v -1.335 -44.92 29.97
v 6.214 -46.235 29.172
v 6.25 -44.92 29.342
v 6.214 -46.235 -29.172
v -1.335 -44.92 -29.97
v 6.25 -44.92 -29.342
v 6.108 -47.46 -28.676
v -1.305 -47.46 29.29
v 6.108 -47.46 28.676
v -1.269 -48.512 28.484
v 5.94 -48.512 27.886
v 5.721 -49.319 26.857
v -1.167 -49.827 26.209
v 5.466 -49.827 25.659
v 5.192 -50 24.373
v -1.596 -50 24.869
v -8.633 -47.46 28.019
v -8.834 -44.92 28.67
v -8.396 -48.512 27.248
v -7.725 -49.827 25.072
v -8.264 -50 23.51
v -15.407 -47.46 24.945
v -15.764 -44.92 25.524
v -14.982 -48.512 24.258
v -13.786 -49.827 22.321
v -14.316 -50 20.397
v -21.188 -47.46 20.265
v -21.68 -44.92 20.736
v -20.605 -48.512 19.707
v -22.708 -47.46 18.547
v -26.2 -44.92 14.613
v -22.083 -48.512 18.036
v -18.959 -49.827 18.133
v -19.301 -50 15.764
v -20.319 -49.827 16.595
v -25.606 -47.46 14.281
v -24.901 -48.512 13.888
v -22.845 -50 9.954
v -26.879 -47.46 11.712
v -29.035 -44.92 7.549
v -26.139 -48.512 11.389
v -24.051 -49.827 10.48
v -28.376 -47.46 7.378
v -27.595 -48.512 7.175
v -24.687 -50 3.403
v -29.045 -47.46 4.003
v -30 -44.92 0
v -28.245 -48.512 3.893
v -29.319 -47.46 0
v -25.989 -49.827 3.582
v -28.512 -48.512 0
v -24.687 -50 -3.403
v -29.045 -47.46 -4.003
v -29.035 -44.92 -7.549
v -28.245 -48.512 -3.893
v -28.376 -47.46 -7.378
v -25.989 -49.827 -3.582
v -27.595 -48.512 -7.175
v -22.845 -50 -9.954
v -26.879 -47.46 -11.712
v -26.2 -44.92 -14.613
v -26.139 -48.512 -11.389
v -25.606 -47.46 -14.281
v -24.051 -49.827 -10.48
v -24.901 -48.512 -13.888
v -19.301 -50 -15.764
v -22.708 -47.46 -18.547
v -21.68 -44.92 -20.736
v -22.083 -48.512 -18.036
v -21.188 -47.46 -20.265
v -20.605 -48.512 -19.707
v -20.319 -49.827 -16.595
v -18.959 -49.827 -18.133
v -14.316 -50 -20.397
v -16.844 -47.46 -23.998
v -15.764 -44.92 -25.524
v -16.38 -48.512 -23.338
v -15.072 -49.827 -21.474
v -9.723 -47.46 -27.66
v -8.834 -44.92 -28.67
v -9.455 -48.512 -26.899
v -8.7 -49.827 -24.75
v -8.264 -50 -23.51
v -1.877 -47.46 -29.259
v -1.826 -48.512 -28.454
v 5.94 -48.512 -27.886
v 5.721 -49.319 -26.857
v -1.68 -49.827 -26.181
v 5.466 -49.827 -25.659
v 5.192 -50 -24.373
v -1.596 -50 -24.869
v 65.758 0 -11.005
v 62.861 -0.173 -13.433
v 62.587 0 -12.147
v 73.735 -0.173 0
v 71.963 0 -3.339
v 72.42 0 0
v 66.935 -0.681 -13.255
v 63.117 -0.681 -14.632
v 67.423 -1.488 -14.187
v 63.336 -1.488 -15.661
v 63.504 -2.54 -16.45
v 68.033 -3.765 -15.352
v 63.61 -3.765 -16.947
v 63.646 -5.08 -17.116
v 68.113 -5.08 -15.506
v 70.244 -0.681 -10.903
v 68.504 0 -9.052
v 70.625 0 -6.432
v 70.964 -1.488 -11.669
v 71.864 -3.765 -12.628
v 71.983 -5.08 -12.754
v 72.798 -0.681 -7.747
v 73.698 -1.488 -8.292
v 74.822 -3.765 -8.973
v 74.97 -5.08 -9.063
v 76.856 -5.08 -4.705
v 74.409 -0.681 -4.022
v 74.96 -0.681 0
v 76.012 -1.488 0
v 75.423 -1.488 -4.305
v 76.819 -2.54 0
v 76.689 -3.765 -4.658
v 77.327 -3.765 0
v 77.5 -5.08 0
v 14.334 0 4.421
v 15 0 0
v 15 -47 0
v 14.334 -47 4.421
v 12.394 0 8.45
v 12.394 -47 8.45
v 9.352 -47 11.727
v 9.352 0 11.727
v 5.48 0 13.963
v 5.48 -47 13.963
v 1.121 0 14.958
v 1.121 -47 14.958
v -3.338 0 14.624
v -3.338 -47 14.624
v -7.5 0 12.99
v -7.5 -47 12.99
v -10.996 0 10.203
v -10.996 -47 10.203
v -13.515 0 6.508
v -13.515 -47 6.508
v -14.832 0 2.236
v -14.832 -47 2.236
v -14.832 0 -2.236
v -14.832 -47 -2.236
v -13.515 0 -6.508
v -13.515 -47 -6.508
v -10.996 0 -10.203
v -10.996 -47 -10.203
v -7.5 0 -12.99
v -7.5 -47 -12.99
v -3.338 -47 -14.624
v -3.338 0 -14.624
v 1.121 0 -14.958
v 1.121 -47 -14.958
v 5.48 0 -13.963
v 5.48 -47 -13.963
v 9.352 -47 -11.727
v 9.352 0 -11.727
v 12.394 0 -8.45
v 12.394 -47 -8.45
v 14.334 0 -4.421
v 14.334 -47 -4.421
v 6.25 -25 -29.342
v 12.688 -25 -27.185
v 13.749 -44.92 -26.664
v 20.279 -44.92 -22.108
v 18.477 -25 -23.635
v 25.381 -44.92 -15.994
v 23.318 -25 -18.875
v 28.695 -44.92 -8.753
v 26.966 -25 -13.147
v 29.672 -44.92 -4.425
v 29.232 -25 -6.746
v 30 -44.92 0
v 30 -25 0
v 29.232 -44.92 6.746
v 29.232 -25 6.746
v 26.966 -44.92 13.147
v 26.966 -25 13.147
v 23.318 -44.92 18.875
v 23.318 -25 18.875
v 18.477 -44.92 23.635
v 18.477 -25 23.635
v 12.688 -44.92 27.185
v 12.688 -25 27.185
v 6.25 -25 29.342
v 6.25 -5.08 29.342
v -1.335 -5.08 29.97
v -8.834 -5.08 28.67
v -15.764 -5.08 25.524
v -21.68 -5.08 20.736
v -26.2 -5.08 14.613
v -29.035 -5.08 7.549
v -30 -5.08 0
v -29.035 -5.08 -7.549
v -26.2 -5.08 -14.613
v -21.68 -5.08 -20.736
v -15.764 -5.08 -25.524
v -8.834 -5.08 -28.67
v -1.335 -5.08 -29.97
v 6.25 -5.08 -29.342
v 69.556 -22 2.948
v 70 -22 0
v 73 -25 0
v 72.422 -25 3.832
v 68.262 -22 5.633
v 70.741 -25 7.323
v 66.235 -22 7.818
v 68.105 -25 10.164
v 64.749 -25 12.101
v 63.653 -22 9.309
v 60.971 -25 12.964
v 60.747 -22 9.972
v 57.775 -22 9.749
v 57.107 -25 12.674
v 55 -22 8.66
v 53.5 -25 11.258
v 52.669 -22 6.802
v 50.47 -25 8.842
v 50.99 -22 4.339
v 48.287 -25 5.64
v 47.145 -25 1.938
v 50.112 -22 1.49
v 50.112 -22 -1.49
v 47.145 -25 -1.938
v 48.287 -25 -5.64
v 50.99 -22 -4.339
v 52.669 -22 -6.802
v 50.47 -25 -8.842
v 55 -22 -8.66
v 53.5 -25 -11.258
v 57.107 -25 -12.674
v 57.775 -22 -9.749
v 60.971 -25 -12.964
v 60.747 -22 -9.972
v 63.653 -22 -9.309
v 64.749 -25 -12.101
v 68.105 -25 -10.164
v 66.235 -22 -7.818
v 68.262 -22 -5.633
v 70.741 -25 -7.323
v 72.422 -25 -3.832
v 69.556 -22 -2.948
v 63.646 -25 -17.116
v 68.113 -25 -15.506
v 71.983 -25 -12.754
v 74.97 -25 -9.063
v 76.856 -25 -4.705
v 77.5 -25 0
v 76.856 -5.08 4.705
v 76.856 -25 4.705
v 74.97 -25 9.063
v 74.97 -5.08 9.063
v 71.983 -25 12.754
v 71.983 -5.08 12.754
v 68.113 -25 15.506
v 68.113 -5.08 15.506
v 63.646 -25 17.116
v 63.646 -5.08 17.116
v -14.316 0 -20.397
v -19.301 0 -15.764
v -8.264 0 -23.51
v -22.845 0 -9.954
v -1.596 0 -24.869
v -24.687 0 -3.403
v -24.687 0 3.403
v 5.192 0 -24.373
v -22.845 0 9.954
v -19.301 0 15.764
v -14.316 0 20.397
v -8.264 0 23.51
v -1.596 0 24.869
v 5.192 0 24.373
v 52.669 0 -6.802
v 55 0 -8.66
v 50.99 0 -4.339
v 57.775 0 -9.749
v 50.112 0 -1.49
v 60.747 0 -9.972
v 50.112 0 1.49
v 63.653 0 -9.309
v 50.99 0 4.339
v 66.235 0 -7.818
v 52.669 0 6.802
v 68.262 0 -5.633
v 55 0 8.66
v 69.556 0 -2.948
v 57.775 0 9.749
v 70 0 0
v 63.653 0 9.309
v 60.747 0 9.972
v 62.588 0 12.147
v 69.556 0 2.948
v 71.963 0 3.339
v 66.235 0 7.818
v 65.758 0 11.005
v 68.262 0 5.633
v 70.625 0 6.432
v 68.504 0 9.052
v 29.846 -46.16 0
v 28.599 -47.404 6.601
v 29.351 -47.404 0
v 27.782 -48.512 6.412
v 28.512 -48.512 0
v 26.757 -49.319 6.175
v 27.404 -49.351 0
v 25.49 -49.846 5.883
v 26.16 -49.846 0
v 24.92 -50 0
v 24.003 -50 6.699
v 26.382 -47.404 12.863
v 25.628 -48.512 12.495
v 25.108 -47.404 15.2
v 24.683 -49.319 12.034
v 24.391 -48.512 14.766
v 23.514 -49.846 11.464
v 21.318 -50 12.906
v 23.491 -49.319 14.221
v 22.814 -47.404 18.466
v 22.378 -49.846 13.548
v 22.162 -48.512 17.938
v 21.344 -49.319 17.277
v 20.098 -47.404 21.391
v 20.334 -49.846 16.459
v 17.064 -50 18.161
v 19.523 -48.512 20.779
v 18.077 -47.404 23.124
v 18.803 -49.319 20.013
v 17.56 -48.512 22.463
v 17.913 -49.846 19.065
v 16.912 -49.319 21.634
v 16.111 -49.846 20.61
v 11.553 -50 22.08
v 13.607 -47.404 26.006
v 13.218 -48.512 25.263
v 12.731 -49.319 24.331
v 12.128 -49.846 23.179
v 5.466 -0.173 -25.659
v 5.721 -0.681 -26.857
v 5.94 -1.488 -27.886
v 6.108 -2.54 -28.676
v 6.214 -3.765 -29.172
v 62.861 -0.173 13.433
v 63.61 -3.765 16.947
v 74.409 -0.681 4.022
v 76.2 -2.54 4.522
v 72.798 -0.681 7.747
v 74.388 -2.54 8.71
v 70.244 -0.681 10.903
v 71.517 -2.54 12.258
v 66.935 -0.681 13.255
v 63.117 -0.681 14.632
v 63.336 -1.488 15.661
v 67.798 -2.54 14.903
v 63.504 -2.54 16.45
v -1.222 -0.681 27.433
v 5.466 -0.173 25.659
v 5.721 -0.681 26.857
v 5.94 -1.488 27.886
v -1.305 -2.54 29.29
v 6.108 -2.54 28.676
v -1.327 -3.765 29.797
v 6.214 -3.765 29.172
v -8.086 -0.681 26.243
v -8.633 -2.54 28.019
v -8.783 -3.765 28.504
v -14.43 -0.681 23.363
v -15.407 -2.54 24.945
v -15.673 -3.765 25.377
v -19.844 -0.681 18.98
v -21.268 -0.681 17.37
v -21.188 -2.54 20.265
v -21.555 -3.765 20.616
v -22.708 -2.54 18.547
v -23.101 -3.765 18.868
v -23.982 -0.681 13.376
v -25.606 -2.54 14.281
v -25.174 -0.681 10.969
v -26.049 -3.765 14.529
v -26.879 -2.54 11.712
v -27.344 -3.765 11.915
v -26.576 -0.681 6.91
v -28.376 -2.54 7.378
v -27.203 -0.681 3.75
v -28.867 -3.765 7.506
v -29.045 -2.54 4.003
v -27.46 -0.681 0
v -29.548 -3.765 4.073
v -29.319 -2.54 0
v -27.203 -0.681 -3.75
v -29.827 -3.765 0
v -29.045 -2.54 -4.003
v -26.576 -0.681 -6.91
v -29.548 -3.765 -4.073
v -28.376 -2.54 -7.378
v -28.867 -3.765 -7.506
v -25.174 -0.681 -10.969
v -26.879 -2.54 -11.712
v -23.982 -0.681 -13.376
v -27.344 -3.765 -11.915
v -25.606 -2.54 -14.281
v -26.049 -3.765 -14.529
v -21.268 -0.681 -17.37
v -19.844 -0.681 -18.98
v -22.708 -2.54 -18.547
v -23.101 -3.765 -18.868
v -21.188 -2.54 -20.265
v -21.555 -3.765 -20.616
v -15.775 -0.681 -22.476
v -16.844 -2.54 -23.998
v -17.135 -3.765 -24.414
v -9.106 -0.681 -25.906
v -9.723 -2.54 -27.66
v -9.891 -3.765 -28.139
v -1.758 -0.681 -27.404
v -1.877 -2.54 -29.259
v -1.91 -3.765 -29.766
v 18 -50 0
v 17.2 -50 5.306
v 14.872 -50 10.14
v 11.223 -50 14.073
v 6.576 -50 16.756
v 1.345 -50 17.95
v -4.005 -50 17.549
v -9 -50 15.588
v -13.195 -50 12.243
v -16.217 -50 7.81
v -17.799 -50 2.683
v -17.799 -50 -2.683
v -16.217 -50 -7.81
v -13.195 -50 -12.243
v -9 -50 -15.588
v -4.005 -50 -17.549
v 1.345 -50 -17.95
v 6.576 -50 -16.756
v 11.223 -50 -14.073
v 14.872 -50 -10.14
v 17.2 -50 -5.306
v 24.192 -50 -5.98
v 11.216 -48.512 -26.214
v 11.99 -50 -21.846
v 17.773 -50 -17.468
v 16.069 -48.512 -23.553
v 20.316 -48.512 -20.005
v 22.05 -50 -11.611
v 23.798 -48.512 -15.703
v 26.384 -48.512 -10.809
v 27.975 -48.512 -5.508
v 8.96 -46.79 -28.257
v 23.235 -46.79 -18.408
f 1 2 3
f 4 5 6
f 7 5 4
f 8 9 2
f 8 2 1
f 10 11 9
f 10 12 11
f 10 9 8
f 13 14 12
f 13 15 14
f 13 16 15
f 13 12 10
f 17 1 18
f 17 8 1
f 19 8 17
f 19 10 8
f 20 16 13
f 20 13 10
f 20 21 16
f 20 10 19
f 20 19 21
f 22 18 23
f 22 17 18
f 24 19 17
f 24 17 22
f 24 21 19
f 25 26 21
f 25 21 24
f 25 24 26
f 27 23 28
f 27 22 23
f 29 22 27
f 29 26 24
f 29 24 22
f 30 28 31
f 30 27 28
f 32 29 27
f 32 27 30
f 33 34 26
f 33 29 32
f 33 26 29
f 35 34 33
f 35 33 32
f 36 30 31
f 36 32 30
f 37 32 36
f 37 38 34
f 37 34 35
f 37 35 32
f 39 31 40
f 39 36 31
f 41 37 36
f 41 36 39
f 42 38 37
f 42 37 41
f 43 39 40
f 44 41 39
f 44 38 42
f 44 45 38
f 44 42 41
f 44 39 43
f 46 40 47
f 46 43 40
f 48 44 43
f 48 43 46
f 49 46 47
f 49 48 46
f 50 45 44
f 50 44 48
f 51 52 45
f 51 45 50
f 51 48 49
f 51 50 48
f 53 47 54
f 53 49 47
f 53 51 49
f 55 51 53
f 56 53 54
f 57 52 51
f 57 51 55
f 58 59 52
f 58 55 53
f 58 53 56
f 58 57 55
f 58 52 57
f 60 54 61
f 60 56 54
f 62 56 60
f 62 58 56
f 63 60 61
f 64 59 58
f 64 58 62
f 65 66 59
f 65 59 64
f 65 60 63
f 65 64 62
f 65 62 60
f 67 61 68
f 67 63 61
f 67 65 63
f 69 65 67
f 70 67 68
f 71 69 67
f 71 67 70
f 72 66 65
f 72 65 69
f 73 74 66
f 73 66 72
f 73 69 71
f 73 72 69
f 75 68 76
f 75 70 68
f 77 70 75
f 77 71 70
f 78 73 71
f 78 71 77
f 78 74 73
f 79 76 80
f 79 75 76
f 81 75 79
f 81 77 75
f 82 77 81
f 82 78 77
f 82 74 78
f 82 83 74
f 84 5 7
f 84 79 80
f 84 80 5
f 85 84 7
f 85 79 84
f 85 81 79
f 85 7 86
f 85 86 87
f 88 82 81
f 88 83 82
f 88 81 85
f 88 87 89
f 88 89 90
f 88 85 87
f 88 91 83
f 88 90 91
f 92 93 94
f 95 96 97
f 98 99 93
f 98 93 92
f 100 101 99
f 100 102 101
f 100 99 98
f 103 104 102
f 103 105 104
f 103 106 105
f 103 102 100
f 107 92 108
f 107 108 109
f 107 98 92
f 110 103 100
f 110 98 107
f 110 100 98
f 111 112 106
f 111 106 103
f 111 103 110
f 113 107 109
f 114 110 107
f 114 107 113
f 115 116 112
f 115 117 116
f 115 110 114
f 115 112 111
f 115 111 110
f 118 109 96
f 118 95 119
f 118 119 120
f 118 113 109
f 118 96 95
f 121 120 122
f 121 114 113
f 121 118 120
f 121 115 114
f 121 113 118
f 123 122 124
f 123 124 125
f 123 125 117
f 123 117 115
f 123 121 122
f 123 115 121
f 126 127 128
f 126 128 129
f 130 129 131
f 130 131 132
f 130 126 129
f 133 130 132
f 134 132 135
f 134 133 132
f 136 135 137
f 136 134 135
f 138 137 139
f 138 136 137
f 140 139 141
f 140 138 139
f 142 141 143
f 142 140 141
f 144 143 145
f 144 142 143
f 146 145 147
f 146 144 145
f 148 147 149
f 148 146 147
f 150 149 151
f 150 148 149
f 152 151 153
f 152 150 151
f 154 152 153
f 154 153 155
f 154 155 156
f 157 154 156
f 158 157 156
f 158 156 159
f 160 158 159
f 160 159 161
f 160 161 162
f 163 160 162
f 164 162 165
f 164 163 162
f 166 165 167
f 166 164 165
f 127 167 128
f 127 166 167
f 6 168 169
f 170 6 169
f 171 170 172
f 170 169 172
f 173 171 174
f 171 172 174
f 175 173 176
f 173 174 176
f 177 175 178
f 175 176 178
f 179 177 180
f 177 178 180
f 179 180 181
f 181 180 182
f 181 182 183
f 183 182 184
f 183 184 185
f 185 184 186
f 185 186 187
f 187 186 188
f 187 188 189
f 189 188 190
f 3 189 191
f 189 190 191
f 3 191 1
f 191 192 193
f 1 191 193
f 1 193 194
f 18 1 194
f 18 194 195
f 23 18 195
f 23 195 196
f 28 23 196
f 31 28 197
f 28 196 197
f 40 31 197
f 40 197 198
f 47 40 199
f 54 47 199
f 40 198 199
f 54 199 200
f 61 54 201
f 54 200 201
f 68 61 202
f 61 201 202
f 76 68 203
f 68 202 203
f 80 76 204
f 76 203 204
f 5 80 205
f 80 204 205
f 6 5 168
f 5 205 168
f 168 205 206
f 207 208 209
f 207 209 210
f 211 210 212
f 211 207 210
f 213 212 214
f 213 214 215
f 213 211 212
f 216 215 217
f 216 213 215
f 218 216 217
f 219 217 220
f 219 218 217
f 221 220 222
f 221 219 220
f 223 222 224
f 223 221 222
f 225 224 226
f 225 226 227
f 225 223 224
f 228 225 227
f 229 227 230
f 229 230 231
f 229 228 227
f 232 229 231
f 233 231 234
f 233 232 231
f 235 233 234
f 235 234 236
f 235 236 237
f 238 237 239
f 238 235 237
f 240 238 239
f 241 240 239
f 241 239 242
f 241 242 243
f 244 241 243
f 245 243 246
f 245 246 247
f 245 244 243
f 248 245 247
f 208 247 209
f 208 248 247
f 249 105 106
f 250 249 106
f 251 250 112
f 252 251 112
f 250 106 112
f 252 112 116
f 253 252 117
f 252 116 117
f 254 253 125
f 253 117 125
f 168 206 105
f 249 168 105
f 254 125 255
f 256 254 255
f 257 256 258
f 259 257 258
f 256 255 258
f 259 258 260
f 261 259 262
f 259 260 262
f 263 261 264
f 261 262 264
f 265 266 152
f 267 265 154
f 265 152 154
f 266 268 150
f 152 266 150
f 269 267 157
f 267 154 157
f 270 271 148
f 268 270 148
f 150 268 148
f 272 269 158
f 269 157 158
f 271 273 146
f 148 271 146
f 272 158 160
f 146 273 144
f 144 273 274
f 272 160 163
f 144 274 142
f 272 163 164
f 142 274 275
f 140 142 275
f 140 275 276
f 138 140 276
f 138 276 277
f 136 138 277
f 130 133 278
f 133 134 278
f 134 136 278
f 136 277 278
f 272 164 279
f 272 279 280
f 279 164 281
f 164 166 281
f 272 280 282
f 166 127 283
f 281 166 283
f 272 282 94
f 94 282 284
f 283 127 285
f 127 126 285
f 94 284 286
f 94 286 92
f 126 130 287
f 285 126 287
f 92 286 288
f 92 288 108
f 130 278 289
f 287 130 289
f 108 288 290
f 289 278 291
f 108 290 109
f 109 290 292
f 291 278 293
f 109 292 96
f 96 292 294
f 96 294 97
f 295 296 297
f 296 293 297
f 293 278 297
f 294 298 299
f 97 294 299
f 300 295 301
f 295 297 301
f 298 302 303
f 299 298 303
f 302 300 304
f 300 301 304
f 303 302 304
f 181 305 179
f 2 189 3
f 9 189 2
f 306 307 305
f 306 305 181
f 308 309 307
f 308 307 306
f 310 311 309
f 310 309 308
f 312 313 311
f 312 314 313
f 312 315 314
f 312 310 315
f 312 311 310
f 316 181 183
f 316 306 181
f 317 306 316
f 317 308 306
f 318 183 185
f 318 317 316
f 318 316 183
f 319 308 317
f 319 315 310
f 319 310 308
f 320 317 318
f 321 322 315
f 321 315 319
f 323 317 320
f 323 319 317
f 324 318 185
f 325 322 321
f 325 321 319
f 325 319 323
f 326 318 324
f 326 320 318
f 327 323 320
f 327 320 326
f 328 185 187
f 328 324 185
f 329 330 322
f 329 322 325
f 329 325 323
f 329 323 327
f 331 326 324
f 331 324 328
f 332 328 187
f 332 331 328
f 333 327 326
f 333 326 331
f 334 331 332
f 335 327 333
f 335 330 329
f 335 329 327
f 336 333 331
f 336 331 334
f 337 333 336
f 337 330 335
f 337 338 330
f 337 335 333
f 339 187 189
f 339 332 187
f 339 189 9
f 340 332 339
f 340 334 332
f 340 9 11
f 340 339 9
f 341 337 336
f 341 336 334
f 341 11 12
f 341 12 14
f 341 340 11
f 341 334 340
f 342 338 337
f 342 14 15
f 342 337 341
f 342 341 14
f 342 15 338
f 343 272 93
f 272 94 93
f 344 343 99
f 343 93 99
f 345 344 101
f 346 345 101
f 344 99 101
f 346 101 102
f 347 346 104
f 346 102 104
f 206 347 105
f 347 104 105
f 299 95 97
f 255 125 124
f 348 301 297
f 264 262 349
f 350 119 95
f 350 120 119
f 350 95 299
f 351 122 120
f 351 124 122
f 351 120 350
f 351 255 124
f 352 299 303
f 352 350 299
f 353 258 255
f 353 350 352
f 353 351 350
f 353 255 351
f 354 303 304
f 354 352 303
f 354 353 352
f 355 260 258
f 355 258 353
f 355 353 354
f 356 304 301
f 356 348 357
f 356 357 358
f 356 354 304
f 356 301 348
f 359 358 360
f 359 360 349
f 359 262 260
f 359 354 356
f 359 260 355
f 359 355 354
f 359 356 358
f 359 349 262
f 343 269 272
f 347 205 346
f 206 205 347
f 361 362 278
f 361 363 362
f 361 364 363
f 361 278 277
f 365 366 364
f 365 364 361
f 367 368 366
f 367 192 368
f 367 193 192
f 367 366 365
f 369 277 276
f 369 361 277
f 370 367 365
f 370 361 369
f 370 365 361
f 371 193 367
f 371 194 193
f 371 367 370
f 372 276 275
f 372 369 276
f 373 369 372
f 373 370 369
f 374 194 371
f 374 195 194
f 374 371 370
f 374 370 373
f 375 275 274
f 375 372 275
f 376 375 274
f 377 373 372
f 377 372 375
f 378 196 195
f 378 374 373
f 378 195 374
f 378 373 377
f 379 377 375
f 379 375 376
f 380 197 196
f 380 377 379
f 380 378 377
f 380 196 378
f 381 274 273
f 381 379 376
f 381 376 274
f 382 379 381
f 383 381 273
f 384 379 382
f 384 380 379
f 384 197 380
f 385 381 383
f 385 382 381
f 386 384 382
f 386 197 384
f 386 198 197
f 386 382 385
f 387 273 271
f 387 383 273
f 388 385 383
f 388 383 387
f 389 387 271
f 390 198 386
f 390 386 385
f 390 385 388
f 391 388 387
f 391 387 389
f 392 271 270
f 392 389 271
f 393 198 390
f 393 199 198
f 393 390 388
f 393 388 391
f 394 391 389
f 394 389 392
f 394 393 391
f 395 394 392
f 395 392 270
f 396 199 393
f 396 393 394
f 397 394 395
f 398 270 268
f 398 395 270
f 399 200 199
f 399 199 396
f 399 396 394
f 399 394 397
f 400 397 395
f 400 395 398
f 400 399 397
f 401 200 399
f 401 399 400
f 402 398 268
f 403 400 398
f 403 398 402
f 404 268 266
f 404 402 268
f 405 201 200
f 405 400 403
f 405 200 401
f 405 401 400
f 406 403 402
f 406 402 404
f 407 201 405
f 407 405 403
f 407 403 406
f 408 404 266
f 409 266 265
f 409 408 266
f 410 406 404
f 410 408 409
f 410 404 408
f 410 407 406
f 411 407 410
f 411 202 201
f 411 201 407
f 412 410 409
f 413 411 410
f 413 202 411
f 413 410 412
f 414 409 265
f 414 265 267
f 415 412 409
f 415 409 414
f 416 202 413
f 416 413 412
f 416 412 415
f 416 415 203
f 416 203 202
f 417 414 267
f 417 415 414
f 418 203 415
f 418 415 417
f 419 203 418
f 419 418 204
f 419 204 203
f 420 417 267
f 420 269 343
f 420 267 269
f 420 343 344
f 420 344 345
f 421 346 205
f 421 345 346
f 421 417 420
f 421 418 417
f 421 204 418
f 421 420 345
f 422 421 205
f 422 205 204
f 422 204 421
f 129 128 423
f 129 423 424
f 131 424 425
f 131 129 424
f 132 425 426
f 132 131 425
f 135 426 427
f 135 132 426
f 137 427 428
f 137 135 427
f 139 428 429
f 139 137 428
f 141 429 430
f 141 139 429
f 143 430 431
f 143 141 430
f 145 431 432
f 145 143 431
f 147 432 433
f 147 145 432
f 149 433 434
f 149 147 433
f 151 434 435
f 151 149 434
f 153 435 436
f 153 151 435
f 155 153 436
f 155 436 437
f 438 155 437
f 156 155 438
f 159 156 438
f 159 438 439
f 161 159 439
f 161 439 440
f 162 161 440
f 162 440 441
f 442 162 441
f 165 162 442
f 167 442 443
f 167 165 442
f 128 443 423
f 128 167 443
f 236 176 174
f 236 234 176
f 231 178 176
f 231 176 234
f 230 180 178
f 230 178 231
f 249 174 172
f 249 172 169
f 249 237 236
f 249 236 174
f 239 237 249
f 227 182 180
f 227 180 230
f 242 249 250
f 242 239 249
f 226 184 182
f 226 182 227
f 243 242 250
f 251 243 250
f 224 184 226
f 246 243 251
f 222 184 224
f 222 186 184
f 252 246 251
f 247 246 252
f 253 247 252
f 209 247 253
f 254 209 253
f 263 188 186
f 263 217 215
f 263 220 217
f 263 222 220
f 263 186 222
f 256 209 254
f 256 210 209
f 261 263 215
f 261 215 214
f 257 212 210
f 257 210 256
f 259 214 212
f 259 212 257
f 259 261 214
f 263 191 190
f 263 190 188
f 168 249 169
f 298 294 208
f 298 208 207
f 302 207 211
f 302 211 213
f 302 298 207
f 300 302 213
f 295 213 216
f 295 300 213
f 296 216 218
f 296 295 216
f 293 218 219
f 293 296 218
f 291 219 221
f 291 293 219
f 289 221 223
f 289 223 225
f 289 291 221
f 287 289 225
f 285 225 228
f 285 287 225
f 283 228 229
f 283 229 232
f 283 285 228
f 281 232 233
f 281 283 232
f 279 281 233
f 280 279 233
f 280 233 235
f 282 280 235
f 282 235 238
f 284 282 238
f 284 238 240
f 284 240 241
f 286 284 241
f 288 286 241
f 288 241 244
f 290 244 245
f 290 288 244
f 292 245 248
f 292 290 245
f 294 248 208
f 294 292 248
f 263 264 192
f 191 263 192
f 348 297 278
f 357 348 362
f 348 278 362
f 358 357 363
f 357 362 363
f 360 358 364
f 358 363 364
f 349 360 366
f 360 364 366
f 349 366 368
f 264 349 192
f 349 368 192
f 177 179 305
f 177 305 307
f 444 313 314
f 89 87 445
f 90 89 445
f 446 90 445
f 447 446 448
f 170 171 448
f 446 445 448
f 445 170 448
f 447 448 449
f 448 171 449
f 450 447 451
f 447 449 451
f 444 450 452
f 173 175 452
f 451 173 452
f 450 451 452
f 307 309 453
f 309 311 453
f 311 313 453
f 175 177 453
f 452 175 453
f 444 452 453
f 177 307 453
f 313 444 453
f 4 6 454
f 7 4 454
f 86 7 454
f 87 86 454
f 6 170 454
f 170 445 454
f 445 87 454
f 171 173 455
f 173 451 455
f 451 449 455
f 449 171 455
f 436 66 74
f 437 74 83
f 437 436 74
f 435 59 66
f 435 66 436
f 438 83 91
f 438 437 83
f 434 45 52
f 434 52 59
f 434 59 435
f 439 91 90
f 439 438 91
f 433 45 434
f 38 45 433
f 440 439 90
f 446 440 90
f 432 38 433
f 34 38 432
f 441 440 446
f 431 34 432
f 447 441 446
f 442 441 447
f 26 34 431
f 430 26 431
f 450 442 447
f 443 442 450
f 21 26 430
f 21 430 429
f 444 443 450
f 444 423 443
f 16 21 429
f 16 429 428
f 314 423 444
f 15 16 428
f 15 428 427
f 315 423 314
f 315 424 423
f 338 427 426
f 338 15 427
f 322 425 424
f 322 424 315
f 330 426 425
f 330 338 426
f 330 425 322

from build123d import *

# Parameters (mm, degrees)
F0_R     = 15
F0_R_2   = 10
F1_DEPTH = 25
F2_DEPTH = 50
F3_R     = 5.08
F4_SIZE  = 3


with BuildPart() as f1:
    # F0 (on Front) → F1 (new body)
    with BuildSketch(Plane.XZ):
        with BuildLine():
            ThreePointArc((6.25, -29.3417364858), (23.3184476327, -18.8745860882), (30, 0))
            ThreePointArc((30, 0), (23.3184476327, 18.8745860882), (6.25, 29.3417364858))
            ThreePointArc((6.25, 29.3417364858), (-30, 0), (6.25, -29.3417364858))
        make_face()
        Circle(F0_R, mode=Mode.SUBTRACT)
        with BuildLine():
            ThreePointArc((6.25, 29.3417364858), (23.3184476327, 18.8745860882), (30, 0))
            ThreePointArc((30, 0), (23.3184476327, -18.8745860882), (6.25, -29.3417364858))
            Line((6.25, -29.3417364858), (63.6458333333, -17.11601295))
            ThreePointArc((63.6458333333, -17.11601295), (42.5, 0), (63.6458333333, 17.11601295))
            Line((63.6458333333, 17.11601295), (6.25, 29.3417364858))
        make_face()
        with BuildLine():
            ThreePointArc((77.5, 0), (73.6024277858, 11.0101752181), (63.6458333333, 17.11601295))
            ThreePointArc((63.6458333333, 17.11601295), (42.5, 0), (63.6458333333, -17.11601295))
            ThreePointArc((63.6458333333, -17.11601295), (73.6024277858, -11.0101752181), (77.5, 0))
        make_face()
        with Locations((60, 0)):
            Circle(F0_R_2, mode=Mode.SUBTRACT)
    extrude(amount=F1_DEPTH)

    # F0 (on Front) → F2 (join)
    with BuildSketch(Plane.XZ):
        with BuildLine():
            ThreePointArc((6.25, -29.3417364858), (23.3184476327, -18.8745860882), (30, 0))
            ThreePointArc((30, 0), (23.3184476327, 18.8745860882), (6.25, 29.3417364858))
            ThreePointArc((6.25, 29.3417364858), (-30, 0), (6.25, -29.3417364858))
        make_face()
        Circle(F0_R, mode=Mode.SUBTRACT)
    extrude(amount=F2_DEPTH)

    # F3
    f3_edges = [f1.edges().sort_by_distance(p)[0] for p in [
        (34.947917, 0, -23.228875),
        (-6.25, -50, 29.341736),
    ]]
    fillet(f3_edges, radius=F3_R)

    # F4
    f4_edges = [f1.edges().sort_by_distance(p)[0] for p in [
        (-15, -50, 0),
        (-5.191667, -50, 24.373202),
        (50, -25, 0),
    ]]
    chamfer(f4_edges, length=F4_SIZE)


solid = f1.part
